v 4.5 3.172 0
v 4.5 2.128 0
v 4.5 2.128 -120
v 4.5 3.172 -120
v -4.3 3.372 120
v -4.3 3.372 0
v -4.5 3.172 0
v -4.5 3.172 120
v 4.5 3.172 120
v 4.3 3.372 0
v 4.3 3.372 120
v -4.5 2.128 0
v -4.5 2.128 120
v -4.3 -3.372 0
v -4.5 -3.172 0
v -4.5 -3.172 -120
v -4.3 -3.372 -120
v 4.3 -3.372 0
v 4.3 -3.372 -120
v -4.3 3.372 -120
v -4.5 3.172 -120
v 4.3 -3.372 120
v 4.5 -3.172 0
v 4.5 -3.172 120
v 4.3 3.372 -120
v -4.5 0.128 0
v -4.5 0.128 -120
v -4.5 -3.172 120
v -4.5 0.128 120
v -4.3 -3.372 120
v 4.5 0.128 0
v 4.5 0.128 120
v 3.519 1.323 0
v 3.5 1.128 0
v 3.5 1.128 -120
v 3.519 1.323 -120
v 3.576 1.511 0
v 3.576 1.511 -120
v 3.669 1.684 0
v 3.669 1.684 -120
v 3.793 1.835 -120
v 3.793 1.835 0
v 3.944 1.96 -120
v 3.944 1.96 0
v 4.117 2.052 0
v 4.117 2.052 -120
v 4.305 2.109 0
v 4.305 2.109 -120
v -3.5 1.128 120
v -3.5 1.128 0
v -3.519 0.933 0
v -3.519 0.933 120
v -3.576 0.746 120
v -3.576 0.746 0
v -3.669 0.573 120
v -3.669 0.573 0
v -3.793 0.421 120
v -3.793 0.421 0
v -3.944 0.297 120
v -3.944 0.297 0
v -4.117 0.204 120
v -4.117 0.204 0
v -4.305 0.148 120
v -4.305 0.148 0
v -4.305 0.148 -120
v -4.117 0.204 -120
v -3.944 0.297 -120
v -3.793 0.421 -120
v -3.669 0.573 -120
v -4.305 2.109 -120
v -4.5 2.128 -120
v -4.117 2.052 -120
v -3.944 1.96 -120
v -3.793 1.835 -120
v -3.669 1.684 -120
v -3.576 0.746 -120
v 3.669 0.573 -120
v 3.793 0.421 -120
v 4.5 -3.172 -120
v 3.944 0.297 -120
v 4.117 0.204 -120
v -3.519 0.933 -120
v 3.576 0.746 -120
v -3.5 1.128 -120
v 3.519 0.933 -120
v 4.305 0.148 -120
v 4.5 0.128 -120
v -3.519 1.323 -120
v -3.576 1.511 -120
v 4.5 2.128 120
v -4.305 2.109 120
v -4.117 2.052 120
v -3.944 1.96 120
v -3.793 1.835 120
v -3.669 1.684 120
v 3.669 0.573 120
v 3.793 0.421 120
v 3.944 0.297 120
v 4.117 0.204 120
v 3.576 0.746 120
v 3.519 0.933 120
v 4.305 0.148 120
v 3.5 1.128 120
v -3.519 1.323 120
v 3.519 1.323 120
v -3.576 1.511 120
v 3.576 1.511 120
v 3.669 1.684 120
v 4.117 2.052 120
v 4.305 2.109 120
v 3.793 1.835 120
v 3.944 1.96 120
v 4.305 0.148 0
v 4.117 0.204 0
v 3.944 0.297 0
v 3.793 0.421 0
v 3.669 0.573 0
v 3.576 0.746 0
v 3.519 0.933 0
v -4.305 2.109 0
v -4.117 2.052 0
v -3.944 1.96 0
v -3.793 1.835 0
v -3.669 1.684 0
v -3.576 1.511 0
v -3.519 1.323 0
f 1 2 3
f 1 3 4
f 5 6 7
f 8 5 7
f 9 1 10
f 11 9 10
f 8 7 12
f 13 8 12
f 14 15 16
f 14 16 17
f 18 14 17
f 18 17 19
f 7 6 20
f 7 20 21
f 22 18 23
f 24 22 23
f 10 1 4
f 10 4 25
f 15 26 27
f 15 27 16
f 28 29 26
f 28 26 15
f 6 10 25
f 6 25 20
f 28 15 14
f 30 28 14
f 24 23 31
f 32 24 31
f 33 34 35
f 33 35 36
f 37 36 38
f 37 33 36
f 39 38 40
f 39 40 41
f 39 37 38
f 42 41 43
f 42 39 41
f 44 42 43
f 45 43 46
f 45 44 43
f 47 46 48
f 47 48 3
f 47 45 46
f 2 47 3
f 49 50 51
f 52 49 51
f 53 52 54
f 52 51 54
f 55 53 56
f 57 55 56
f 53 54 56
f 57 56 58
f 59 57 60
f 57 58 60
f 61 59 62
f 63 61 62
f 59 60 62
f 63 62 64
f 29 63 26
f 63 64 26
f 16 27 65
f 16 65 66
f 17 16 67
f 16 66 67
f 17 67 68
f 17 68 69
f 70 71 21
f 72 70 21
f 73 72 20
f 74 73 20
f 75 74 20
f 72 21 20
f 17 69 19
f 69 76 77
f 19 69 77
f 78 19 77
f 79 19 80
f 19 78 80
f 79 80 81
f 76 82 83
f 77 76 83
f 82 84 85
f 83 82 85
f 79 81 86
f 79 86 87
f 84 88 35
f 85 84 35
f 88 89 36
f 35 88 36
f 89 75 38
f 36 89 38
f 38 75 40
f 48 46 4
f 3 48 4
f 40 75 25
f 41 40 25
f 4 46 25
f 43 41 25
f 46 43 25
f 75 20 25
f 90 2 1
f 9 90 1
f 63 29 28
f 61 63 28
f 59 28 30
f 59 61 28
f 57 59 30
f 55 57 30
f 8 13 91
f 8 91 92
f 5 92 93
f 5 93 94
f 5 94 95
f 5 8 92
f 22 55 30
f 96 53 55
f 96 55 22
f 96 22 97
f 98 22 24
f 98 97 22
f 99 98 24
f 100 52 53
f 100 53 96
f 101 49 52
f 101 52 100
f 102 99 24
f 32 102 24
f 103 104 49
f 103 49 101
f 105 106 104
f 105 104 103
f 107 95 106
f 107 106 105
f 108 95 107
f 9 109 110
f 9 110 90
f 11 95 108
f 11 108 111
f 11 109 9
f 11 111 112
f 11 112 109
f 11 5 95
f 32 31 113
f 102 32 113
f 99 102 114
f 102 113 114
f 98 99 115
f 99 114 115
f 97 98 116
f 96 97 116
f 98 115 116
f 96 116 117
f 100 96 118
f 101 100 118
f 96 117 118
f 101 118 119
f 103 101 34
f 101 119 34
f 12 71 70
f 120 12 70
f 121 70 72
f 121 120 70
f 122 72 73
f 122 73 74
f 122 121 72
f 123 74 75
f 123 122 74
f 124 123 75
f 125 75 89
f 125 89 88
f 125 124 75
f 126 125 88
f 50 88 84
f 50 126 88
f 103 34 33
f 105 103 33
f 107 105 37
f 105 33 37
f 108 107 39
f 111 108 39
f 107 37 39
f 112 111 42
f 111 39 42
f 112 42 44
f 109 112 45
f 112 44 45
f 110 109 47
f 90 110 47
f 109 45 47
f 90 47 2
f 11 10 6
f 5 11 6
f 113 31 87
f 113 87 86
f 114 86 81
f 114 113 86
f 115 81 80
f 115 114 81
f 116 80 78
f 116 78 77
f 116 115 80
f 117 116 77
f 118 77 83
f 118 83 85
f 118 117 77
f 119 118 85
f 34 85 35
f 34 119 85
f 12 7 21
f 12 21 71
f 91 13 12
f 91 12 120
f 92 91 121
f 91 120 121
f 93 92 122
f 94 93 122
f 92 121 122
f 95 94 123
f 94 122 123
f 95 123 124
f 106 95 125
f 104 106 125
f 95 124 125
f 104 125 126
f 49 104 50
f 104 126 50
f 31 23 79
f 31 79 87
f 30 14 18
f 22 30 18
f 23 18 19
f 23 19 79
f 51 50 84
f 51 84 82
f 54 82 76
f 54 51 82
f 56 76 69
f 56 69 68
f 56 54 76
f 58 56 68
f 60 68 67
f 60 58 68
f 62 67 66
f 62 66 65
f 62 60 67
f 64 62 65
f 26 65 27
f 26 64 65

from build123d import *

# Parameters (mm, degrees)
BOSS_EXTRUDE1_DEPTH = 120


with BuildPart() as part:
    # Sketch1 → Boss-Extrude1 (new, symmetric)
    with BuildSketch(Plane.XY):
        with BuildLine():
            Line((-4.5, 0.128302789), (-4.5, -3.171697211))
            Line((-4.5, -3.171697211), (-4.3, -3.371697211))
            Line((-4.3, -3.371697211), (4.3, -3.371697211))
            Line((4.3, -3.371697211), (4.5, -3.171697211))
            Line((4.5, -3.171697211), (4.5, 0.128302789))
            ThreePointArc((4.5, 0.128302789), (3.792893219, 0.421196008), (3.5, 1.128302789))
            ThreePointArc((3.5, 1.128302789), (3.792893219, 1.83540957), (4.5, 2.128302789))
            Line((4.5, 2.128302789), (4.5, 3.171697211))
            Line((4.5, 3.171697211), (4.3, 3.371697211))
            Line((4.3, 3.371697211), (-4.3, 3.371697211))
            Line((-4.3, 3.371697211), (-4.5, 3.171697211))
            Line((-4.5, 3.171697211), (-4.5, 2.128302789))
            ThreePointArc((-4.5, 2.128302789), (-3.792893215, 1.835409567), (-3.5, 1.128302779))
            ThreePointArc((-3.5, 1.128302779), (-3.792893222, 0.421196004), (-4.5, 0.128302789))
        make_face()
    extrude(amount=BOSS_EXTRUDE1_DEPTH, both=True)


solid = part.part
